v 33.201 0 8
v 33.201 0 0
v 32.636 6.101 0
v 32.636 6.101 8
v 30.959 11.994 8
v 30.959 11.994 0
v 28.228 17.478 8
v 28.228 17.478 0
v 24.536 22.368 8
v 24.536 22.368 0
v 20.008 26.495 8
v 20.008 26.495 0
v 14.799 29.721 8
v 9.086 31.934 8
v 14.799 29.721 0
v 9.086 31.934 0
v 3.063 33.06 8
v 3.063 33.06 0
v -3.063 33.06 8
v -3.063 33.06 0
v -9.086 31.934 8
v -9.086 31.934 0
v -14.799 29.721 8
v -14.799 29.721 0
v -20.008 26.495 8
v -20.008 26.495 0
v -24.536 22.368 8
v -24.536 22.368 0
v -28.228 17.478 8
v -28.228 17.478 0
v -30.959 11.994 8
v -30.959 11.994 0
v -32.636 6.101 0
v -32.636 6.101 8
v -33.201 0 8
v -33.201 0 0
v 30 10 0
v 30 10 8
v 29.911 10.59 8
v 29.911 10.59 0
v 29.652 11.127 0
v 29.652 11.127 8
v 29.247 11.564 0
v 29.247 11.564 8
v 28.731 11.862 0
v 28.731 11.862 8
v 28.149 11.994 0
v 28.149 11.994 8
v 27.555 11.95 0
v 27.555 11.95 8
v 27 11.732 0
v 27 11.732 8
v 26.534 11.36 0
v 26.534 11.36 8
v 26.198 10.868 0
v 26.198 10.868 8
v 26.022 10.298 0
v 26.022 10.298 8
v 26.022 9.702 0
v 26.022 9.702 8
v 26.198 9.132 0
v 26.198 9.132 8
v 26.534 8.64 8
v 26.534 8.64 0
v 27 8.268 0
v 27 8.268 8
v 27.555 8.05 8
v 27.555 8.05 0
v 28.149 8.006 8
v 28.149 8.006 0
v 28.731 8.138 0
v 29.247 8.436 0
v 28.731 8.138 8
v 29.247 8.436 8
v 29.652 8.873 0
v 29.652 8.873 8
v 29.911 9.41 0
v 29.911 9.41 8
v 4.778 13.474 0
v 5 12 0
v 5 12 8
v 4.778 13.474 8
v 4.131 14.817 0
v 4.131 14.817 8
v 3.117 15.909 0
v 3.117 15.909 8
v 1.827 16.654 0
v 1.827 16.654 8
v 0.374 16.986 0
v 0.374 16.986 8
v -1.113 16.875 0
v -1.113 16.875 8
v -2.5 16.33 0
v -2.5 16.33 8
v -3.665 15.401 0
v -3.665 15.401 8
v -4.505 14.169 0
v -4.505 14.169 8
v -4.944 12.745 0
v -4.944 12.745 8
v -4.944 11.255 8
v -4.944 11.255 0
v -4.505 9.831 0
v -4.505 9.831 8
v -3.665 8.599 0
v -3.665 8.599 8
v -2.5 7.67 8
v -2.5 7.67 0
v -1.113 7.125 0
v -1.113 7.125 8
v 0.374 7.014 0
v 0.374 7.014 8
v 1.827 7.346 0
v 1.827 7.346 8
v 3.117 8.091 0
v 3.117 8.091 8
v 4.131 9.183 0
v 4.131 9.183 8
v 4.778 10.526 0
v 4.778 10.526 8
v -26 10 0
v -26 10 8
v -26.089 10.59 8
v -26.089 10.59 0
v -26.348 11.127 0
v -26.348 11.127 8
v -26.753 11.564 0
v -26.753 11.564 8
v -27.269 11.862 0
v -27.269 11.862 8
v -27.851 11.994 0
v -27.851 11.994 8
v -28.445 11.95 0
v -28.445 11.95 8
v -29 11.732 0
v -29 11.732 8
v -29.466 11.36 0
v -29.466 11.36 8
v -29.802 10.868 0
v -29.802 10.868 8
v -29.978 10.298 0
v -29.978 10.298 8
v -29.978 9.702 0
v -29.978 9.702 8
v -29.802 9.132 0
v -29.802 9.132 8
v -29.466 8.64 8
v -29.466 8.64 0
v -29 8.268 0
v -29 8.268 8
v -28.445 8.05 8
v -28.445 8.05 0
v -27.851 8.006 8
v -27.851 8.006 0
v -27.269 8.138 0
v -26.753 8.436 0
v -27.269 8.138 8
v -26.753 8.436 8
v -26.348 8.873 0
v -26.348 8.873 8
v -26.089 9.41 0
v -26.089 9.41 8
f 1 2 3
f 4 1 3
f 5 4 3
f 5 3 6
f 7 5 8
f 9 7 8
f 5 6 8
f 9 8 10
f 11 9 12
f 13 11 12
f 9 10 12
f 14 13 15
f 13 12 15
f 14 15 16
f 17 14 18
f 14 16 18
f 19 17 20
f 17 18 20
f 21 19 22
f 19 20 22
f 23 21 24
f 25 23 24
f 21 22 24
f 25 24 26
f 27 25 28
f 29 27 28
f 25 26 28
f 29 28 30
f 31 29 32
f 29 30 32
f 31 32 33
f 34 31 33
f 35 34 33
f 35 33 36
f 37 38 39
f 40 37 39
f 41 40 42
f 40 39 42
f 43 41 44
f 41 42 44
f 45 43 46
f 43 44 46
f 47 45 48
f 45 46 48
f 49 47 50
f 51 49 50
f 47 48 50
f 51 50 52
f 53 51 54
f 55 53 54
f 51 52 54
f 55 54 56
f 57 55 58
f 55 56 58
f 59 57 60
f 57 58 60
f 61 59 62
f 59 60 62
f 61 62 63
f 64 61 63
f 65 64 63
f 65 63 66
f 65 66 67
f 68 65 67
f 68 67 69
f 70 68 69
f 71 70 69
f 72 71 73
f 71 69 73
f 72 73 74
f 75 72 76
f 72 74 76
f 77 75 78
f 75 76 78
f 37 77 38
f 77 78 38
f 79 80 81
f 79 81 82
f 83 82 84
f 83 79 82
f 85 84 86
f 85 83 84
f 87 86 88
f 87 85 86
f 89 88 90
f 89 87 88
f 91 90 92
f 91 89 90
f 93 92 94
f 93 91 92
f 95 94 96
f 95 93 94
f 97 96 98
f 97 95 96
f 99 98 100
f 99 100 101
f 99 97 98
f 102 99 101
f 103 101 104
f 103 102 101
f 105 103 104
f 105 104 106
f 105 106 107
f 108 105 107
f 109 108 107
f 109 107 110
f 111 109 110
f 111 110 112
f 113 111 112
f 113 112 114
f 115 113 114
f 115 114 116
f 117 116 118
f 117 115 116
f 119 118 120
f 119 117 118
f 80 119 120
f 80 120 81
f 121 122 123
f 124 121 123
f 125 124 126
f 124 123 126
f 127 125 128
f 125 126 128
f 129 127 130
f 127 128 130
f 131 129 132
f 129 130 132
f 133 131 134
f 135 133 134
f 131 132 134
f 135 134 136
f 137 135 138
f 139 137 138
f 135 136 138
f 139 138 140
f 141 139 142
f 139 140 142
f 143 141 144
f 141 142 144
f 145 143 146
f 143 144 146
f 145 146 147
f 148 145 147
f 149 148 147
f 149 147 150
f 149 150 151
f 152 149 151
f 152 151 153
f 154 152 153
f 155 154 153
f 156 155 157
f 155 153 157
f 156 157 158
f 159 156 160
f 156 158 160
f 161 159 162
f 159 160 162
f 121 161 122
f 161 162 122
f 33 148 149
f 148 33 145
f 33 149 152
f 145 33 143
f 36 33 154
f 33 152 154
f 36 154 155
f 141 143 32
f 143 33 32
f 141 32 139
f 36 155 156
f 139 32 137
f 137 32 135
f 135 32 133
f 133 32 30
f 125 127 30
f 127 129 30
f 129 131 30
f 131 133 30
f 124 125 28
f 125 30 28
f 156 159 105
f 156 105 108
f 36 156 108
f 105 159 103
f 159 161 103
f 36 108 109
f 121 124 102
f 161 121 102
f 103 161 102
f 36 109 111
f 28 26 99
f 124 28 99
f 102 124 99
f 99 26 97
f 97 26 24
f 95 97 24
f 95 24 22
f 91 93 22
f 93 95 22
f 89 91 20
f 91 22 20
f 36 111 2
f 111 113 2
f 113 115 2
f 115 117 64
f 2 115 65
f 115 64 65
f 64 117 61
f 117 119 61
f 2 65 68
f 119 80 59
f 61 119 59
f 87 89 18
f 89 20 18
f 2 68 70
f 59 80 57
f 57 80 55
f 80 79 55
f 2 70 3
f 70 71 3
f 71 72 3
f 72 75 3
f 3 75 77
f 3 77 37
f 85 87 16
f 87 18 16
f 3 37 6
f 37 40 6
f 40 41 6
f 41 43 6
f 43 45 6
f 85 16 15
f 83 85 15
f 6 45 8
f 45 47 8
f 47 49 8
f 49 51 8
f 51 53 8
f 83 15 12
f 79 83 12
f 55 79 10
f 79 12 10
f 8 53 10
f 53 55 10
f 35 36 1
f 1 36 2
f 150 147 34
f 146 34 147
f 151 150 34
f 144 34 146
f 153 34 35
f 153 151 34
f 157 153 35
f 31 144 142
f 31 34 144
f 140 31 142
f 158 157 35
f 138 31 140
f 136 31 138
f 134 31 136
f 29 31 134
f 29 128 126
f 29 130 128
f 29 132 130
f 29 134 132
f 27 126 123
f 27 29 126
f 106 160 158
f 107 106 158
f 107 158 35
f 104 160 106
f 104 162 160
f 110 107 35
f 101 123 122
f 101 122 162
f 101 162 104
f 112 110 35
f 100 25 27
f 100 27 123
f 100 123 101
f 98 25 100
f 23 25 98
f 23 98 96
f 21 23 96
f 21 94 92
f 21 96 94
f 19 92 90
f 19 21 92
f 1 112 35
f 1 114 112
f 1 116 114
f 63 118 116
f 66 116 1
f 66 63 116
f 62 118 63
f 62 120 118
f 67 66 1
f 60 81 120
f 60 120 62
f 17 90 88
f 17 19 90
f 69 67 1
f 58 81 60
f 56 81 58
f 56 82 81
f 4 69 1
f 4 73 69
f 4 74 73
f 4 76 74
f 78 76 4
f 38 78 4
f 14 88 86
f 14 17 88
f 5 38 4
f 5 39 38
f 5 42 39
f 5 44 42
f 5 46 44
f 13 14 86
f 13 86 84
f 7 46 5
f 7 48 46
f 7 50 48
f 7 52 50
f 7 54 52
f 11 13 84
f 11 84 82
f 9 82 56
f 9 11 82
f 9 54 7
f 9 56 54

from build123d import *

# Parameters (mm, degrees)
SKETCH_1_R          = 5
EXTRUDE_1_DEPTH     = 8
SKETCH_2_R          = 2
CUT_EXTRUDE_1_DEPTH = 8


with BuildPart() as part:
    # 草图1 → 凸台-拉伸1 (new body)
    with BuildSketch(Plane.XY):
        with BuildLine():
            Line((-33.201361832, 0), (33.201361832, 0))
            ThreePointArc((33.201361832, 0), (0, 33.201361832), (-33.201361832, 0))
        make_face()
        with Locations((0, 12)):
            Circle(SKETCH_1_R, mode=Mode.SUBTRACT)
    extrude(amount=EXTRUDE_1_DEPTH)

    # 草图2 → 切除-拉伸1 (cut)
    with BuildSketch(Plane.XY.offset(8)):
        with Locations((-28, 10)):
            Circle(SKETCH_2_R)
        with Locations((28, 10)):
            Circle(SKETCH_2_R)
    extrude(amount=-CUT_EXTRUDE_1_DEPTH, mode=Mode.SUBTRACT)


solid = part.part
